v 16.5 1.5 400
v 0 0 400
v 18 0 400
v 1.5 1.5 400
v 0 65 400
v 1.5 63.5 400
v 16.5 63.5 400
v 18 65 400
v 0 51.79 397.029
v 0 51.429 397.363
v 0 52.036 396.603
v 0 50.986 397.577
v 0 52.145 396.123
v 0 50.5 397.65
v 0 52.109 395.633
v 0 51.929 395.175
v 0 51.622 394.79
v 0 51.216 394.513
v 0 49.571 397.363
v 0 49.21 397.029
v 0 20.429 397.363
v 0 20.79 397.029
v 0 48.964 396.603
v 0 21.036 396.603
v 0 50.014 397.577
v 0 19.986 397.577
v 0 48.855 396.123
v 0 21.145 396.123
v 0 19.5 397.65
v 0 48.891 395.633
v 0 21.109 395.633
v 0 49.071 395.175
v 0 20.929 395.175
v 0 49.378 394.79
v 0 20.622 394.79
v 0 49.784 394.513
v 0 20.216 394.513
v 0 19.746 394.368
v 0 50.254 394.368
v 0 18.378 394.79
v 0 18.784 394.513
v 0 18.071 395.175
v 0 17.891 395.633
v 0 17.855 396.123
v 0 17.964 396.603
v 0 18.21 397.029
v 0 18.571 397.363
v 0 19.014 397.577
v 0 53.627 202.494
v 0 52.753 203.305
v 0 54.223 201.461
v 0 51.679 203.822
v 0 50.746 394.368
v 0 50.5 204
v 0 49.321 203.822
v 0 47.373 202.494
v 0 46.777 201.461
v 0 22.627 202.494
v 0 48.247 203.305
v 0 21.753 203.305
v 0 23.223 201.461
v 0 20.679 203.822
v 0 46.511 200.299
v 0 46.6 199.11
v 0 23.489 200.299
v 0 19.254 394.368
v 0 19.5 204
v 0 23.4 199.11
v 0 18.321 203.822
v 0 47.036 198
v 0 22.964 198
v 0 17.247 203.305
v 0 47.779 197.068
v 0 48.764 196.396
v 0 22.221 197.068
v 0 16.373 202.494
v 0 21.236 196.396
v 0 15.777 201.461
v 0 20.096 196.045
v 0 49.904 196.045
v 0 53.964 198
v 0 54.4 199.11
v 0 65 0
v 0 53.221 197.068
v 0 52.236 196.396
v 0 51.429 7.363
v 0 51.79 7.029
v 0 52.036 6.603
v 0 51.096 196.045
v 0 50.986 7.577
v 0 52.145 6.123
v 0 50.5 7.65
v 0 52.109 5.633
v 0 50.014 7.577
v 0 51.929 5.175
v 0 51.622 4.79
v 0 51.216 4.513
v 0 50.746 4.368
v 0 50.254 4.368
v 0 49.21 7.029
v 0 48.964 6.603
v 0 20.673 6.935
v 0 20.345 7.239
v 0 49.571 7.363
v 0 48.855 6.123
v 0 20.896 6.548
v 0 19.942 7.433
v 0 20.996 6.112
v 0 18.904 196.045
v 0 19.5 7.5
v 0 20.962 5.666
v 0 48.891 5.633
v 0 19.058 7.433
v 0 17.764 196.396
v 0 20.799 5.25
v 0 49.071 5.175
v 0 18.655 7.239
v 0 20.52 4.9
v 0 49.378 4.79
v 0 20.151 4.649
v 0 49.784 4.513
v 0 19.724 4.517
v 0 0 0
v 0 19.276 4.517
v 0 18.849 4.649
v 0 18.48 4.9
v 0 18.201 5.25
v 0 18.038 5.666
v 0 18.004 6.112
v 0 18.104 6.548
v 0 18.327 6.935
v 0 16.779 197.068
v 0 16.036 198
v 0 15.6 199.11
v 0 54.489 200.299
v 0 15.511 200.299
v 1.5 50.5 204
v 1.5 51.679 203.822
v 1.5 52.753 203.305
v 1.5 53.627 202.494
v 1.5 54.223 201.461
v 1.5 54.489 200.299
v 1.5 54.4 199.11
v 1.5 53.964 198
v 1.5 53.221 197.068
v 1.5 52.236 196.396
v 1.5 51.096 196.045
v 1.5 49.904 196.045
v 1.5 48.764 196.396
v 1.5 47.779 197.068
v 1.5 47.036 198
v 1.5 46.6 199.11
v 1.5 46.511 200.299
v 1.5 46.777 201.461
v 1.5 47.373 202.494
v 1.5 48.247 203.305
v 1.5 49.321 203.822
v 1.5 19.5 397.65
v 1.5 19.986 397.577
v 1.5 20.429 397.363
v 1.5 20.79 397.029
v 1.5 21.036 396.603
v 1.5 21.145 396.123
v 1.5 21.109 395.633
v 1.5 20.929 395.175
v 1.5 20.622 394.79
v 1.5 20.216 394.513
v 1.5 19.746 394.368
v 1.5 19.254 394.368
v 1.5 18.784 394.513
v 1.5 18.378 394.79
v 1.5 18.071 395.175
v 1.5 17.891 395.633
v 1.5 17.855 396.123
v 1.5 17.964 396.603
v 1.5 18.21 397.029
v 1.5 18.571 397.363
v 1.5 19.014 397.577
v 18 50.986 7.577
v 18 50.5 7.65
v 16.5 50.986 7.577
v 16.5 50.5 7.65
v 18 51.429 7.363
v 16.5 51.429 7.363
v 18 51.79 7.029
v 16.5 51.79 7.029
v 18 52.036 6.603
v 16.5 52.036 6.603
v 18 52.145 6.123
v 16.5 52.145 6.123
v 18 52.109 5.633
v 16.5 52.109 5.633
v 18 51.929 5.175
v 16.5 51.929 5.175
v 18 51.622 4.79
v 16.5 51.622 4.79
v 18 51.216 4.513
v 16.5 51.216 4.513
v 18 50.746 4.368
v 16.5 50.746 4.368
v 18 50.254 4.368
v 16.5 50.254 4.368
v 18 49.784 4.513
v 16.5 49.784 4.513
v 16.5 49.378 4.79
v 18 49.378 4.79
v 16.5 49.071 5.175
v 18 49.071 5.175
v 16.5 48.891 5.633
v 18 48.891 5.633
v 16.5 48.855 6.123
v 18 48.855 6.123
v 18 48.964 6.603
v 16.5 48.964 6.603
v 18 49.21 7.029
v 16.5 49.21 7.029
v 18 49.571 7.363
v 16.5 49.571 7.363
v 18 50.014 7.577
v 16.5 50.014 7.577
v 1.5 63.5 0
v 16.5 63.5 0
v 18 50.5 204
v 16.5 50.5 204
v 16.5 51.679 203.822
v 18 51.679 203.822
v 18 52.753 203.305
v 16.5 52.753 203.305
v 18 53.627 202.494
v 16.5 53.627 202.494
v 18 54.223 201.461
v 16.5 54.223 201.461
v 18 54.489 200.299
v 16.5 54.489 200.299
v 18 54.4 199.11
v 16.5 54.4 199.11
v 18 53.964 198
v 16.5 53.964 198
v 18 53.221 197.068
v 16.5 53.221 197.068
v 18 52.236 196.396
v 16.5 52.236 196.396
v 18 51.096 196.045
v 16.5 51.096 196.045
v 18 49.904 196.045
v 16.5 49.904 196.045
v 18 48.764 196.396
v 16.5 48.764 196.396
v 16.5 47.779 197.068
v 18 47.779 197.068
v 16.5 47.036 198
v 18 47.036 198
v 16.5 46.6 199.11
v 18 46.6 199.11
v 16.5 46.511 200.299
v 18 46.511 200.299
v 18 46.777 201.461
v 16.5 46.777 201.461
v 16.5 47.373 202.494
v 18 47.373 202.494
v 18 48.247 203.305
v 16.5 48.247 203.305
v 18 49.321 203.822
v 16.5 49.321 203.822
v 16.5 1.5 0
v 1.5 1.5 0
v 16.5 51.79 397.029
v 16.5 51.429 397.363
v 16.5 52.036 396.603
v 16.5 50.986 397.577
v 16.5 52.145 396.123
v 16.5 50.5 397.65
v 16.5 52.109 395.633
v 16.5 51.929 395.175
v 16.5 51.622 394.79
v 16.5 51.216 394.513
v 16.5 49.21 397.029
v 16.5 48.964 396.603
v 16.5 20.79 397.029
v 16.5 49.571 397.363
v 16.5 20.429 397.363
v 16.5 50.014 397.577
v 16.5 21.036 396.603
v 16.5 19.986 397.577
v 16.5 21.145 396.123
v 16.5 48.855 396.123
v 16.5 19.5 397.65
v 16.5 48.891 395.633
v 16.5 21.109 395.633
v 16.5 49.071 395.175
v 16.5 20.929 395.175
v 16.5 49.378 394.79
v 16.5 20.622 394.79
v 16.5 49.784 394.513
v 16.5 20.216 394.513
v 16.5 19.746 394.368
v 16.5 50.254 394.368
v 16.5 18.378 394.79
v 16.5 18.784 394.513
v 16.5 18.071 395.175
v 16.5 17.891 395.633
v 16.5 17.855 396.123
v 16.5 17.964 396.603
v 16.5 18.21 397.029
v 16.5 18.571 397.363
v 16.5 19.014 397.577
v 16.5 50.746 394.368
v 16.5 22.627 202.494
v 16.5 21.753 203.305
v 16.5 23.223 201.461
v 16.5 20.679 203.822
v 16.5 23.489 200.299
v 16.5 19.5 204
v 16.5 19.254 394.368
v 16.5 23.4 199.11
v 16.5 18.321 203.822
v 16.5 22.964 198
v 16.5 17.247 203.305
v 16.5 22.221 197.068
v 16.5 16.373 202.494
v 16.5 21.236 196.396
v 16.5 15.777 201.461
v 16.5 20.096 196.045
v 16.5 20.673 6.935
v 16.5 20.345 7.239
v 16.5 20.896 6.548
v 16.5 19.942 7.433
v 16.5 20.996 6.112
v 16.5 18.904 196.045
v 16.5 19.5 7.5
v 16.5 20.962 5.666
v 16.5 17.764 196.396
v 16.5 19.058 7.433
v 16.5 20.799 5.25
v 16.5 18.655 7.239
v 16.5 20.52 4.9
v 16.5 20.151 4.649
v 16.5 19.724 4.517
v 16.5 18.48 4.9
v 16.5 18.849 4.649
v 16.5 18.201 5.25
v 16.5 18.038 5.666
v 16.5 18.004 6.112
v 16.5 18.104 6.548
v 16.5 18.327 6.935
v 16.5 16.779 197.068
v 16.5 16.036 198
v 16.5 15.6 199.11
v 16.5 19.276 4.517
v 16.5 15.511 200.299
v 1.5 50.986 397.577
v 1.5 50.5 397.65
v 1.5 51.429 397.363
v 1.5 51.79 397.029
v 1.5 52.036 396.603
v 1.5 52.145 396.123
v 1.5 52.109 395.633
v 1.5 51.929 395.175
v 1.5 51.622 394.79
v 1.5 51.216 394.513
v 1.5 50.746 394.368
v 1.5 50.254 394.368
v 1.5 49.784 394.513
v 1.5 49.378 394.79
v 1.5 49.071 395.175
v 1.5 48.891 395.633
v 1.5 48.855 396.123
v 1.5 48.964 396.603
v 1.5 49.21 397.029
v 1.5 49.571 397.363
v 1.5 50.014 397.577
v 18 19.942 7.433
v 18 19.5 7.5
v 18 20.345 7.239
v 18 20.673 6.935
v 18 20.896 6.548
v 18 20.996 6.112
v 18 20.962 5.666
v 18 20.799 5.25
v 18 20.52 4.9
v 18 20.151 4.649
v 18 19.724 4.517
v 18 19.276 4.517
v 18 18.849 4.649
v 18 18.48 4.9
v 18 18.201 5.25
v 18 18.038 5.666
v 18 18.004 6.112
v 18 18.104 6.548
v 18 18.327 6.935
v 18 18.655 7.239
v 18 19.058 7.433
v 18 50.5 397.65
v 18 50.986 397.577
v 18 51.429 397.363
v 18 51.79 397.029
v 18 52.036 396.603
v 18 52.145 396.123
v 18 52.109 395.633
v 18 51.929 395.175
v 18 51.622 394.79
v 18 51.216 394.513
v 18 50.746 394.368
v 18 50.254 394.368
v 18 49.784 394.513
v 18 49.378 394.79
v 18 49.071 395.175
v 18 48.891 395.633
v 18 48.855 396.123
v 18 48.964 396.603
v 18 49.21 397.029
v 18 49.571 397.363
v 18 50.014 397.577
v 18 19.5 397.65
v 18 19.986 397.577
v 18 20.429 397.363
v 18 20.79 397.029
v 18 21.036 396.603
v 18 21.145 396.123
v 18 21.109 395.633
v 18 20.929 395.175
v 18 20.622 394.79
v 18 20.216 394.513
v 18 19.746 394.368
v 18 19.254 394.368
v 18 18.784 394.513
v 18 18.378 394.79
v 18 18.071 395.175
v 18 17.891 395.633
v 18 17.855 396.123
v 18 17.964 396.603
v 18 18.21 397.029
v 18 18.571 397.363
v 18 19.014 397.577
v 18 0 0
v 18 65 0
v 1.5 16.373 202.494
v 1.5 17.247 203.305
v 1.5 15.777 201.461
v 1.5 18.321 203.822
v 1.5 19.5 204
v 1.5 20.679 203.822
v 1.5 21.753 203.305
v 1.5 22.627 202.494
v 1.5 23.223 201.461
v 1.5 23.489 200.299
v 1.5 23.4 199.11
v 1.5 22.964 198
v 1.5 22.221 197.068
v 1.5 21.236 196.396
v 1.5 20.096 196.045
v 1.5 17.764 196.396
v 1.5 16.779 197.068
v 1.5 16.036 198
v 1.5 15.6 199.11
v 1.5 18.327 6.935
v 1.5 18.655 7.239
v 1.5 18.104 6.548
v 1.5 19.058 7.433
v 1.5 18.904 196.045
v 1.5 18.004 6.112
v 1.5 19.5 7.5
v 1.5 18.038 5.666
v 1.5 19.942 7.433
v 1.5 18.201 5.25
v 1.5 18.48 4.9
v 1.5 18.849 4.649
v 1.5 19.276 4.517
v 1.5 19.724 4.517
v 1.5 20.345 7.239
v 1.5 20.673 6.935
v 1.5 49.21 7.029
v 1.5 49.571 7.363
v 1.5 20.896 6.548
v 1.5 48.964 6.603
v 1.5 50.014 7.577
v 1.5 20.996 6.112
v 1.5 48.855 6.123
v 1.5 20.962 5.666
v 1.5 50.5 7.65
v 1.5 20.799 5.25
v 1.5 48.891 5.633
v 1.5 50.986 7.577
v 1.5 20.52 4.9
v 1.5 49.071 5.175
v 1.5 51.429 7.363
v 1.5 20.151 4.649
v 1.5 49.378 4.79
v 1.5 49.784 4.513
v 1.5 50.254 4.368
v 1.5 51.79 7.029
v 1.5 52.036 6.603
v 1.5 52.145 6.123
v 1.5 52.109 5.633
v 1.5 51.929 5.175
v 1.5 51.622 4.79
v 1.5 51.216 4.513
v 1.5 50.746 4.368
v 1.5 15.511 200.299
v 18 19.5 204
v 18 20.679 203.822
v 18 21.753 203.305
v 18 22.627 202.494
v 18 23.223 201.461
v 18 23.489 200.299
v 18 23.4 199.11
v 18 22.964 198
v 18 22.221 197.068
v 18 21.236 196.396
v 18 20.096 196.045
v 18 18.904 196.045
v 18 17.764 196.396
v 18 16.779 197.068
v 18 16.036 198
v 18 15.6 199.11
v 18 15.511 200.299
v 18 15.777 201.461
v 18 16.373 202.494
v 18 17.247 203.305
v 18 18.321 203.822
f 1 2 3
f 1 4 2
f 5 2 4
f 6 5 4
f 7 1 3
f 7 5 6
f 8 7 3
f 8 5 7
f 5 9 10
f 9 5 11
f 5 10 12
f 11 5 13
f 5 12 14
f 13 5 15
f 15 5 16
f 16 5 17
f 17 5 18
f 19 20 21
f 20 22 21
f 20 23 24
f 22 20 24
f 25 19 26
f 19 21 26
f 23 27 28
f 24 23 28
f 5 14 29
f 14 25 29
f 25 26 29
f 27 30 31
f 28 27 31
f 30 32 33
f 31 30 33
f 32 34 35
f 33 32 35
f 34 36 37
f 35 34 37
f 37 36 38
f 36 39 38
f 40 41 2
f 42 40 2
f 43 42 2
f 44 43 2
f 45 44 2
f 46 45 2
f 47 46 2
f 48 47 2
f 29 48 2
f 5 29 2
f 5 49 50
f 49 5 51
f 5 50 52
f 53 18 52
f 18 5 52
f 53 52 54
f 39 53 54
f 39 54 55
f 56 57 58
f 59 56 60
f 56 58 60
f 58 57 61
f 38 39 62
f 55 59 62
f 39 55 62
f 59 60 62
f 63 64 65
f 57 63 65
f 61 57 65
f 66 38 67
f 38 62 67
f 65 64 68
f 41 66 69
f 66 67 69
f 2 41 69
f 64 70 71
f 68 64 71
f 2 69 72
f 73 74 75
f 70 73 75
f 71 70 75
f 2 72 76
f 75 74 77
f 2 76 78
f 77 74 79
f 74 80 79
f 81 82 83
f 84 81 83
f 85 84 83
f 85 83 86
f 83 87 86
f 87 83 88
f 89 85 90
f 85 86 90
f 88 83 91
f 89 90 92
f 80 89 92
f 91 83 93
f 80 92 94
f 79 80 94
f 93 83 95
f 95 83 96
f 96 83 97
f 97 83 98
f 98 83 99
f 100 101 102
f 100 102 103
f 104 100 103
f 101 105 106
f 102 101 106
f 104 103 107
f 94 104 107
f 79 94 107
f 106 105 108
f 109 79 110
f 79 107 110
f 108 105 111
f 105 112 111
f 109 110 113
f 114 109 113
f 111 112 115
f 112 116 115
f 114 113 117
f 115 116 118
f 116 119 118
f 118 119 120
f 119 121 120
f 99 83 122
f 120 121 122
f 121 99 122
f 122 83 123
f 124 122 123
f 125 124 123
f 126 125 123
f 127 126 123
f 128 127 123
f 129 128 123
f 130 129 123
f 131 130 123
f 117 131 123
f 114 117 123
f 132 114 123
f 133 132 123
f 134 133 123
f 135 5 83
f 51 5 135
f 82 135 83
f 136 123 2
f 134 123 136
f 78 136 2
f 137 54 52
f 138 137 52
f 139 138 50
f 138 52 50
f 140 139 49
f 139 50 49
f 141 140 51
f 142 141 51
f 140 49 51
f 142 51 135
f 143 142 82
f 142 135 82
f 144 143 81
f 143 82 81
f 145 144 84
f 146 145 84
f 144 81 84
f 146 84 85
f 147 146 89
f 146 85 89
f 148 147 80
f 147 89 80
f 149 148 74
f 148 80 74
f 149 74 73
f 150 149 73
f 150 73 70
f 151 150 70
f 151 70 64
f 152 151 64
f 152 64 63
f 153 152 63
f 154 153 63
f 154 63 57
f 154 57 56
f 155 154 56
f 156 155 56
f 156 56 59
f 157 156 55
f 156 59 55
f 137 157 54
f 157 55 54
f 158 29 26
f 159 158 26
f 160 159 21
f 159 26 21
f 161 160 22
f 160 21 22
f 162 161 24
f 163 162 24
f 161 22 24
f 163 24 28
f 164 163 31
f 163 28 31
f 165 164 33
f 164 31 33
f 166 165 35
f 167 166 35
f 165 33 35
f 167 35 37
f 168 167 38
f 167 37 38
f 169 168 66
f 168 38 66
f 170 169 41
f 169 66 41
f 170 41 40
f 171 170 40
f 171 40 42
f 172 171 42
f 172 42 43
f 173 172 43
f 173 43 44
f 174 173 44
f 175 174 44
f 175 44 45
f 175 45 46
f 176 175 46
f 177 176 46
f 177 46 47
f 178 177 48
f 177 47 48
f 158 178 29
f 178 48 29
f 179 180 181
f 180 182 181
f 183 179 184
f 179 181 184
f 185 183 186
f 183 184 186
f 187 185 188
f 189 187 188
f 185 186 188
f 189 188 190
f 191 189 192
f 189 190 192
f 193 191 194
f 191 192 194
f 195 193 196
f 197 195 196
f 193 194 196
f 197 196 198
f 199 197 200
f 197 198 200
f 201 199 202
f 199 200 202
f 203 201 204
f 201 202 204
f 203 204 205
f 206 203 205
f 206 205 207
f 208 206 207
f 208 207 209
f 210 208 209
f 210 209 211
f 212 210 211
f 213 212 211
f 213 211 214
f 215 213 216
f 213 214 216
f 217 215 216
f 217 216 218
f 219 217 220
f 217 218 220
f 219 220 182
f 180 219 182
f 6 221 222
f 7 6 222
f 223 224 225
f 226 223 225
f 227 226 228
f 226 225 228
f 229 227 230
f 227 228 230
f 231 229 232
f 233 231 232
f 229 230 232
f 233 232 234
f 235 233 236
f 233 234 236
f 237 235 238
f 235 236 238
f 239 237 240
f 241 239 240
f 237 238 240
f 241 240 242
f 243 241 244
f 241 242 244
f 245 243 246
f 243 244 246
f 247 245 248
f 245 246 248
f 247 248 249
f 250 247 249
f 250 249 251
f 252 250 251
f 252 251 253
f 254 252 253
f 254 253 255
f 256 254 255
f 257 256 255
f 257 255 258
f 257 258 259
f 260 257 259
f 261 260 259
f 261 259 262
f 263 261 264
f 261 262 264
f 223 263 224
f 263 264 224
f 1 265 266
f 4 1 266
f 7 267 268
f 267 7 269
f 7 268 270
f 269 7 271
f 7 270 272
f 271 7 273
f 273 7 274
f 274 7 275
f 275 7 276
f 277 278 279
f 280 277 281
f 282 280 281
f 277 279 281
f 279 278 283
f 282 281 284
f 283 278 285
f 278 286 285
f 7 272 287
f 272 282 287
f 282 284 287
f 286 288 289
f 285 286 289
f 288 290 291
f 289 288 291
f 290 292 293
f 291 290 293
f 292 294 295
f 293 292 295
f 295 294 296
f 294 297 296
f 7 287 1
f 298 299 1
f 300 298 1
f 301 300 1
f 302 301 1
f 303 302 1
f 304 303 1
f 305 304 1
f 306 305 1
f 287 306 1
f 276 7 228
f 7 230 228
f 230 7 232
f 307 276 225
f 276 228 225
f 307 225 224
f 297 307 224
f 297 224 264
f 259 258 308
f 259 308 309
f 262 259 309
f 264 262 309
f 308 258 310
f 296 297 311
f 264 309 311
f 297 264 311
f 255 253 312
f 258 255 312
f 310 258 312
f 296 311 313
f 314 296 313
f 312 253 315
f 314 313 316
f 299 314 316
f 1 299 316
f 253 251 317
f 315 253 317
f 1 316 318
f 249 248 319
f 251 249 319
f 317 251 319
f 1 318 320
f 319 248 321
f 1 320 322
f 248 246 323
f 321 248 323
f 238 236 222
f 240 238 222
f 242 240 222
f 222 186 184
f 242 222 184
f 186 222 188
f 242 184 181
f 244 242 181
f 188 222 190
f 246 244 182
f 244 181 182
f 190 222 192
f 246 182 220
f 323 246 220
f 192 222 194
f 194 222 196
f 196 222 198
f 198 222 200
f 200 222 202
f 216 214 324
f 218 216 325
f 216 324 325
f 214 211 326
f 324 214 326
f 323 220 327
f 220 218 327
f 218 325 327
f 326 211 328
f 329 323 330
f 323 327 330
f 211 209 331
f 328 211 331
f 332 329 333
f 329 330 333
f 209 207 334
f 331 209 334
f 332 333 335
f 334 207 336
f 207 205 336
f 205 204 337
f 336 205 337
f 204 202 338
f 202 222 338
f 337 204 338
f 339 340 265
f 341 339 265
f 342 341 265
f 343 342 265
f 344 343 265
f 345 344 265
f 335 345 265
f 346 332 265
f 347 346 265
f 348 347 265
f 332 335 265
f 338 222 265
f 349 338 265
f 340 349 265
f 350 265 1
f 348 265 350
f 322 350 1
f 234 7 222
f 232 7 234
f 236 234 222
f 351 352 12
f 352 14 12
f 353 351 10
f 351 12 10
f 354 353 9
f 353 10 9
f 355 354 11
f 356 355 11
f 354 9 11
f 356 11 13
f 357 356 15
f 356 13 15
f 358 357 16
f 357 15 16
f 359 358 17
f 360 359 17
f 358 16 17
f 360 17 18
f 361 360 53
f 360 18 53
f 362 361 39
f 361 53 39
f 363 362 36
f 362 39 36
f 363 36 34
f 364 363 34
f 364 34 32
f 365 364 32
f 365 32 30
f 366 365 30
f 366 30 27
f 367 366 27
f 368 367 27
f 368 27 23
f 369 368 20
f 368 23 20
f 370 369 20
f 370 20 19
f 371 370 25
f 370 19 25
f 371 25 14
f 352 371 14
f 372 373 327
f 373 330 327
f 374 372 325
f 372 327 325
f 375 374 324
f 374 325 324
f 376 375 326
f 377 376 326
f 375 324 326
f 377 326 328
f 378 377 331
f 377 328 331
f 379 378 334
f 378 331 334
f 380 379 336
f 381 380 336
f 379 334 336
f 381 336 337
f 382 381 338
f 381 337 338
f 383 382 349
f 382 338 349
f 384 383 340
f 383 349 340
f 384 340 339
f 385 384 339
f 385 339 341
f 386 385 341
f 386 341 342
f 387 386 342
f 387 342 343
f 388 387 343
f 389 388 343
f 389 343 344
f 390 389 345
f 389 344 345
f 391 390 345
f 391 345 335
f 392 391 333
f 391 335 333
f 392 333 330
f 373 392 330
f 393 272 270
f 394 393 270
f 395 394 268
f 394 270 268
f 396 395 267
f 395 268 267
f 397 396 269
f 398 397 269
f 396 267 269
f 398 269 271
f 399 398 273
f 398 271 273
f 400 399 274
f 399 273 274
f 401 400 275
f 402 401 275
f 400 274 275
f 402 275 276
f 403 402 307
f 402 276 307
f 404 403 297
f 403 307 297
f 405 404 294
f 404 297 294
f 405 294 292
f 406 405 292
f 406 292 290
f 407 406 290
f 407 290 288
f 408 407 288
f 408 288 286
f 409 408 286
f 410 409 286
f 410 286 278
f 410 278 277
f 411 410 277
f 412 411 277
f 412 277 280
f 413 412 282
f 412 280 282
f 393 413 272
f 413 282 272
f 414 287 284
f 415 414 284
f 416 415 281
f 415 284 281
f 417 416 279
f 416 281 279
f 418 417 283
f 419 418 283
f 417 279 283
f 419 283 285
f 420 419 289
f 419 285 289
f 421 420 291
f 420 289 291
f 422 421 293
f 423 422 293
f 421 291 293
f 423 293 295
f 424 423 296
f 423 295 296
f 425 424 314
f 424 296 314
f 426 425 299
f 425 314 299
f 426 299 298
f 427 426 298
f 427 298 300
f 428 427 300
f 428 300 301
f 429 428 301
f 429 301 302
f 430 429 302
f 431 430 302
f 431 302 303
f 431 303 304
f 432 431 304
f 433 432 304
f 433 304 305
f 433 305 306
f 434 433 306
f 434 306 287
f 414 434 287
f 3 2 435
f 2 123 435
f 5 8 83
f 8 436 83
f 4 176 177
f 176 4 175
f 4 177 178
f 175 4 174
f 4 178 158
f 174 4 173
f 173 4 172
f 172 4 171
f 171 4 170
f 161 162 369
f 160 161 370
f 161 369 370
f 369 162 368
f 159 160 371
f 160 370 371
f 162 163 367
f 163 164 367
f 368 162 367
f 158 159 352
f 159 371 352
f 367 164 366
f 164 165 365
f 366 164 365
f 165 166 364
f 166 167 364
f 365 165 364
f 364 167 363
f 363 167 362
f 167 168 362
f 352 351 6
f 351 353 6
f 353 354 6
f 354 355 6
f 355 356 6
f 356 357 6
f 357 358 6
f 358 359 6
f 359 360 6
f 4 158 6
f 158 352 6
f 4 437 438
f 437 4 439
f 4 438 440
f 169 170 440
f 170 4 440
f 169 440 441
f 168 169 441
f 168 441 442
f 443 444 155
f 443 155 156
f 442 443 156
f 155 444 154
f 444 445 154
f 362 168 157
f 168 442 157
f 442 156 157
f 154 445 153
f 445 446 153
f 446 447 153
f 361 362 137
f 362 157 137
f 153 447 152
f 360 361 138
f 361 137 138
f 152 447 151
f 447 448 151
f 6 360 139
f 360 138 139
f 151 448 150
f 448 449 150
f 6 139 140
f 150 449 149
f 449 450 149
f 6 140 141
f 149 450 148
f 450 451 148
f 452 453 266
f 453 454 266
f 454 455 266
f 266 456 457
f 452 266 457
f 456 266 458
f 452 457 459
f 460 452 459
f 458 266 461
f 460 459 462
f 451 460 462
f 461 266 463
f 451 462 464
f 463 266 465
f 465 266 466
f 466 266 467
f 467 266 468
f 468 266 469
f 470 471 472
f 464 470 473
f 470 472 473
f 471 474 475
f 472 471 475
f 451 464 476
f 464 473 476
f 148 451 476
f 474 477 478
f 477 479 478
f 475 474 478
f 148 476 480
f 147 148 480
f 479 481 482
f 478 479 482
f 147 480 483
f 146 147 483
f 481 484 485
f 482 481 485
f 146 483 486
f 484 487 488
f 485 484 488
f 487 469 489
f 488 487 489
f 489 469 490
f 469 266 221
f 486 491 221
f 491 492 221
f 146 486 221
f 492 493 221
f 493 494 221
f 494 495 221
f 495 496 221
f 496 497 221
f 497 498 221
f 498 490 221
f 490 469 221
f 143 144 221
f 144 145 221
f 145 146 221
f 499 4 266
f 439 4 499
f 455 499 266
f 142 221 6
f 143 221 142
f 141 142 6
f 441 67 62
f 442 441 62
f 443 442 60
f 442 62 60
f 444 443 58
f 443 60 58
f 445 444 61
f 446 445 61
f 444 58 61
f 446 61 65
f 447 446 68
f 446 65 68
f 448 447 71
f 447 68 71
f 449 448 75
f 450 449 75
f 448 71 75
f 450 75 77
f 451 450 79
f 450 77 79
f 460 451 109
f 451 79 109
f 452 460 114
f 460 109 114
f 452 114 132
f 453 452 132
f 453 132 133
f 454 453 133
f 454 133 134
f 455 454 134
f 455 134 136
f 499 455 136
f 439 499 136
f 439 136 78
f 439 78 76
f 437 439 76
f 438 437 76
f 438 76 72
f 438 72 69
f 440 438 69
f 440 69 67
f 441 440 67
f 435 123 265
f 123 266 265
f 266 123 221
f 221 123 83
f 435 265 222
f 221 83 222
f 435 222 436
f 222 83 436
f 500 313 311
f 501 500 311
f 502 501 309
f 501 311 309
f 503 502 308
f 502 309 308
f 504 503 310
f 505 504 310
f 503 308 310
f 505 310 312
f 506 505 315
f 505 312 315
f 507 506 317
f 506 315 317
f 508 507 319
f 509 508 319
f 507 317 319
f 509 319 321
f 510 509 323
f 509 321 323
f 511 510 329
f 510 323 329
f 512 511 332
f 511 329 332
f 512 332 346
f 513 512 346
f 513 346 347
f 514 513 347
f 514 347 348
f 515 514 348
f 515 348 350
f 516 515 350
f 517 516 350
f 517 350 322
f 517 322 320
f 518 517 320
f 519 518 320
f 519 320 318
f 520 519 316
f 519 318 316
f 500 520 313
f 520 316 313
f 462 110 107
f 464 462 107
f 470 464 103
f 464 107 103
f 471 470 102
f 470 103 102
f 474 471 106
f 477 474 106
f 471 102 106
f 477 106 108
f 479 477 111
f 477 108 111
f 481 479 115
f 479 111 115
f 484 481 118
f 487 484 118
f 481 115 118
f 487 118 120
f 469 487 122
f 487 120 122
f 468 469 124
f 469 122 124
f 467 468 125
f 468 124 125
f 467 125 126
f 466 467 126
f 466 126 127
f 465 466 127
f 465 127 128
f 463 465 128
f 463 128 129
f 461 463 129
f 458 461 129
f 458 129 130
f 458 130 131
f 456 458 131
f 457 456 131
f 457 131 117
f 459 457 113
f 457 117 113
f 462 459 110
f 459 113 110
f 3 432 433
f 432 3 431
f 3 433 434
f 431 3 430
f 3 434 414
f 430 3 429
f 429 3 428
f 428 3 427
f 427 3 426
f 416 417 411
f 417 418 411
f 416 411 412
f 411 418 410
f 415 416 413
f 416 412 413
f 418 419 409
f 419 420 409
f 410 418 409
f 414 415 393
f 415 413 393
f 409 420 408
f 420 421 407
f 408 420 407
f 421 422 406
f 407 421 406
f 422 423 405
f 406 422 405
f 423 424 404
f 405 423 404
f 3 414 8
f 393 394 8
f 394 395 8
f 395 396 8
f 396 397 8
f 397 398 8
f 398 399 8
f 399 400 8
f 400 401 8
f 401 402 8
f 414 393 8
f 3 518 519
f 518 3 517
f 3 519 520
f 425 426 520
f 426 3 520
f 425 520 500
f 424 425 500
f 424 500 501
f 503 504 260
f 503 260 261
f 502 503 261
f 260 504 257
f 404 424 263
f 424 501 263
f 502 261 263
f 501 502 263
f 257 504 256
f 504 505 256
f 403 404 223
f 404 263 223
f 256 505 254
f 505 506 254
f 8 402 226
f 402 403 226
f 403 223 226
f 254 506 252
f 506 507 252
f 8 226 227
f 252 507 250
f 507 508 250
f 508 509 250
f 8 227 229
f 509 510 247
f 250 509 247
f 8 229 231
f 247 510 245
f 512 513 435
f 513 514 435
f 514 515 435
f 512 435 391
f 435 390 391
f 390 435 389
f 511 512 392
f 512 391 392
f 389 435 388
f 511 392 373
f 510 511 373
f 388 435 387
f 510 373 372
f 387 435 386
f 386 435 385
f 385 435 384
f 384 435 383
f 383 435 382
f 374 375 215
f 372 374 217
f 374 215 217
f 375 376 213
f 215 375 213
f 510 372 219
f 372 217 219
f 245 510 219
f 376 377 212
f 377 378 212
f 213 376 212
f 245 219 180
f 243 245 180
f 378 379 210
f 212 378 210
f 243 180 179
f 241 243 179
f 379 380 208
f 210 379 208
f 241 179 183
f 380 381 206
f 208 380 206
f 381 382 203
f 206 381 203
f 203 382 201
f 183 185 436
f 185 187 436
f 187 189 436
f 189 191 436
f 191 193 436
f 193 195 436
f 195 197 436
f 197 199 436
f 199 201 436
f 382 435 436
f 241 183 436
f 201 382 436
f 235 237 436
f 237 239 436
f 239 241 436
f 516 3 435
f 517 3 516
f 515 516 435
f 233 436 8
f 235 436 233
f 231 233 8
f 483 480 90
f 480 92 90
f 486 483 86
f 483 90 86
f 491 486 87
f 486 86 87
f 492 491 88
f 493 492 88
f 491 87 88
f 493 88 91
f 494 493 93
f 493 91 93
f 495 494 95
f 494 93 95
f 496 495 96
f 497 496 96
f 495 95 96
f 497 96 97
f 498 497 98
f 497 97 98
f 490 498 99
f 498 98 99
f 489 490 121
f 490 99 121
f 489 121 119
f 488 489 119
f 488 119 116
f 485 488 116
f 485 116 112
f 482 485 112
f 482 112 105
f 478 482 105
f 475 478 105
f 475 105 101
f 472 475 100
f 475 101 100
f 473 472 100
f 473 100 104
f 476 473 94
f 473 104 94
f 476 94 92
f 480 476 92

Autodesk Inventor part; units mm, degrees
ref_plane "YZ Plane" through (0, 0, 0) normal (1, 0, 0) x (0, 1, 0)
ref_plane "XZ Plane" through (0, 0, 0) normal (0, 1, 0) x (-1, 0, 0)
ref_plane "XY Plane" through (0, 0, 0) normal (0, 0, 1) x (1, 0, 0)
sketch "Sketch1" plane through (0, 0, 0) normal (0, 0, 1) x (1, 0, 0)
  line L0 (0, 0) -> (18, 0)
  line L1 (18, 0) -> (18, 65)
  line L2 (18, 65) -> (0, 65)
  line L3 (0, 65) -> (0, 0)
  line L4 (1.5, 63.5) -> (16.5, 63.5)
  line L5 (16.5, 63.5) -> (16.5, 1.5)
  line L6 (16.5, 1.5) -> (1.5, 1.5)
  line L7 (1.5, 1.5) -> (1.5, 63.5)
  dimension "d0" = 18
  dimension "d1" = 65
  dimension "d2" = 1.5
extrude "Extrusion1" add sketch "Sketch1" along normal blind 400
sketch "Sketch2" plane through (0, 0, 0) normal (-1, 0, 0) x (0, 0, 1)
  line L0 (0, 65) -> (400, 65) projected
  circle A0 centre (6, 50.5) radius 1.65 projected
  circle A1 centre (6, 19.5) radius 1.5 projected
  circle A2 centre (396, 19.5) radius 1.65 projected
  circle A3 centre (396, 50.5) radius 1.65 projected
  circle A4 centre (200, 50.5) radius 4
  circle A5 centre (200, 19.5) radius 4
  point P0 (200, 65)
  dimension "d5" = 8
  dimension "d7" = 8
extrude "Extrusion2" cut sketch "Sketch2" against normal blind 20
equation "\"d7\" = d5"
properties part number "X Rail square"
